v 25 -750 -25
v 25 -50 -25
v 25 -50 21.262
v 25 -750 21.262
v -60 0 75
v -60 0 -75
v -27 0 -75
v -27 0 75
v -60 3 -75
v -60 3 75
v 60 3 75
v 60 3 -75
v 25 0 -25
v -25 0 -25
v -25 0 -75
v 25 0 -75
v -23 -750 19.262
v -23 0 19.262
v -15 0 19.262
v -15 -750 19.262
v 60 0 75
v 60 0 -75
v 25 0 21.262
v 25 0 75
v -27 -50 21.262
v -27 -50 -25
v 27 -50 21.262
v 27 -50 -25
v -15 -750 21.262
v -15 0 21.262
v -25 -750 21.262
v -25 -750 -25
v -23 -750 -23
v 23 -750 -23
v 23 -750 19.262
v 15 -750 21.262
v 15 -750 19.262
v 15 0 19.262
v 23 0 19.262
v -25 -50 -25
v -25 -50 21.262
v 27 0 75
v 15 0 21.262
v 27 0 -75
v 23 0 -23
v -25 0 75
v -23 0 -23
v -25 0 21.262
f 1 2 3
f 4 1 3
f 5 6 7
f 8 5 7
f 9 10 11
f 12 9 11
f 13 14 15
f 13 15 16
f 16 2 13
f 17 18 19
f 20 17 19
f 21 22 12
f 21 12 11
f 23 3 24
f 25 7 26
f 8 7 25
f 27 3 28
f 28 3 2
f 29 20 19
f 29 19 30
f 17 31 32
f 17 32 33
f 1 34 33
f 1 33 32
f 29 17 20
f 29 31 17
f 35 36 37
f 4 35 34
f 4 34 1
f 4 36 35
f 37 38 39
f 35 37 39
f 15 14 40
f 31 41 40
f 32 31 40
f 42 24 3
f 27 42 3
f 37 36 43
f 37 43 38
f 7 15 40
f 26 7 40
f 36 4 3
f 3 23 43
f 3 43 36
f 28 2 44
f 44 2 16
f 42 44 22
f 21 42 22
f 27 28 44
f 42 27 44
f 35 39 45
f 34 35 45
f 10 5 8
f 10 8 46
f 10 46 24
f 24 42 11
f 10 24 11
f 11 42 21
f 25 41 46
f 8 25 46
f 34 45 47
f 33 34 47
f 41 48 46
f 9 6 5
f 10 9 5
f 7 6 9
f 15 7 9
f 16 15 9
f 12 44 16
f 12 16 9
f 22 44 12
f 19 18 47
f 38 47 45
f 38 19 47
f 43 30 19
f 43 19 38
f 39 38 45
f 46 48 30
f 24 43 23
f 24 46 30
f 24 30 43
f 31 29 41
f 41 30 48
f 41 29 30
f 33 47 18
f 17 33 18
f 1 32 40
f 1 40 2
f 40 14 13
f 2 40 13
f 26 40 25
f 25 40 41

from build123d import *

# Parameters (mm, degrees)
F0_W     = 120
F0_H     = 150
F1_DEPTH = 3
F3_DEPTH = 750
F5_DEPTH = 2
F7_DEPTH = 2


with BuildPart() as f1:
    # F0 (on Front) → F1 (new body)
    with BuildSketch(Plane.XZ):
        Rectangle(F0_W, F0_H)
    extrude(amount=-F1_DEPTH)

    # F2 (on face) → F3 (join)
    with BuildSketch(Plane.XZ):
        Polygon((-23, 19.26168), (-15, 19.26168), (-15, 21.26168), (-25, 21.26168), (-25, -25), (25, -25), (25, 21.26168), (15, 21.26168), (15, 19.26168), (23, 19.26168), (23, -23), (-23, -23), align=None)
    extrude(amount=F3_DEPTH)

    # F4 (on face) → F5 (join)
    with BuildSketch(Plane.YZ.offset(25)):
        Polygon((-50, -25), (0, -75), (0, 75), (-50, 21.26168), align=None)
    extrude(amount=F5_DEPTH)

    # F6 (on face) → F7 (join)
    with BuildSketch(Plane(origin=(-25, 0, 0), x_dir=(0, -1, 0), z_dir=(-1, 0, 0))):
        Polygon((0, 75), (0, -75), (50, -25), (50, 21.26168), align=None)
    extrude(amount=F7_DEPTH)


solid = f1.part
